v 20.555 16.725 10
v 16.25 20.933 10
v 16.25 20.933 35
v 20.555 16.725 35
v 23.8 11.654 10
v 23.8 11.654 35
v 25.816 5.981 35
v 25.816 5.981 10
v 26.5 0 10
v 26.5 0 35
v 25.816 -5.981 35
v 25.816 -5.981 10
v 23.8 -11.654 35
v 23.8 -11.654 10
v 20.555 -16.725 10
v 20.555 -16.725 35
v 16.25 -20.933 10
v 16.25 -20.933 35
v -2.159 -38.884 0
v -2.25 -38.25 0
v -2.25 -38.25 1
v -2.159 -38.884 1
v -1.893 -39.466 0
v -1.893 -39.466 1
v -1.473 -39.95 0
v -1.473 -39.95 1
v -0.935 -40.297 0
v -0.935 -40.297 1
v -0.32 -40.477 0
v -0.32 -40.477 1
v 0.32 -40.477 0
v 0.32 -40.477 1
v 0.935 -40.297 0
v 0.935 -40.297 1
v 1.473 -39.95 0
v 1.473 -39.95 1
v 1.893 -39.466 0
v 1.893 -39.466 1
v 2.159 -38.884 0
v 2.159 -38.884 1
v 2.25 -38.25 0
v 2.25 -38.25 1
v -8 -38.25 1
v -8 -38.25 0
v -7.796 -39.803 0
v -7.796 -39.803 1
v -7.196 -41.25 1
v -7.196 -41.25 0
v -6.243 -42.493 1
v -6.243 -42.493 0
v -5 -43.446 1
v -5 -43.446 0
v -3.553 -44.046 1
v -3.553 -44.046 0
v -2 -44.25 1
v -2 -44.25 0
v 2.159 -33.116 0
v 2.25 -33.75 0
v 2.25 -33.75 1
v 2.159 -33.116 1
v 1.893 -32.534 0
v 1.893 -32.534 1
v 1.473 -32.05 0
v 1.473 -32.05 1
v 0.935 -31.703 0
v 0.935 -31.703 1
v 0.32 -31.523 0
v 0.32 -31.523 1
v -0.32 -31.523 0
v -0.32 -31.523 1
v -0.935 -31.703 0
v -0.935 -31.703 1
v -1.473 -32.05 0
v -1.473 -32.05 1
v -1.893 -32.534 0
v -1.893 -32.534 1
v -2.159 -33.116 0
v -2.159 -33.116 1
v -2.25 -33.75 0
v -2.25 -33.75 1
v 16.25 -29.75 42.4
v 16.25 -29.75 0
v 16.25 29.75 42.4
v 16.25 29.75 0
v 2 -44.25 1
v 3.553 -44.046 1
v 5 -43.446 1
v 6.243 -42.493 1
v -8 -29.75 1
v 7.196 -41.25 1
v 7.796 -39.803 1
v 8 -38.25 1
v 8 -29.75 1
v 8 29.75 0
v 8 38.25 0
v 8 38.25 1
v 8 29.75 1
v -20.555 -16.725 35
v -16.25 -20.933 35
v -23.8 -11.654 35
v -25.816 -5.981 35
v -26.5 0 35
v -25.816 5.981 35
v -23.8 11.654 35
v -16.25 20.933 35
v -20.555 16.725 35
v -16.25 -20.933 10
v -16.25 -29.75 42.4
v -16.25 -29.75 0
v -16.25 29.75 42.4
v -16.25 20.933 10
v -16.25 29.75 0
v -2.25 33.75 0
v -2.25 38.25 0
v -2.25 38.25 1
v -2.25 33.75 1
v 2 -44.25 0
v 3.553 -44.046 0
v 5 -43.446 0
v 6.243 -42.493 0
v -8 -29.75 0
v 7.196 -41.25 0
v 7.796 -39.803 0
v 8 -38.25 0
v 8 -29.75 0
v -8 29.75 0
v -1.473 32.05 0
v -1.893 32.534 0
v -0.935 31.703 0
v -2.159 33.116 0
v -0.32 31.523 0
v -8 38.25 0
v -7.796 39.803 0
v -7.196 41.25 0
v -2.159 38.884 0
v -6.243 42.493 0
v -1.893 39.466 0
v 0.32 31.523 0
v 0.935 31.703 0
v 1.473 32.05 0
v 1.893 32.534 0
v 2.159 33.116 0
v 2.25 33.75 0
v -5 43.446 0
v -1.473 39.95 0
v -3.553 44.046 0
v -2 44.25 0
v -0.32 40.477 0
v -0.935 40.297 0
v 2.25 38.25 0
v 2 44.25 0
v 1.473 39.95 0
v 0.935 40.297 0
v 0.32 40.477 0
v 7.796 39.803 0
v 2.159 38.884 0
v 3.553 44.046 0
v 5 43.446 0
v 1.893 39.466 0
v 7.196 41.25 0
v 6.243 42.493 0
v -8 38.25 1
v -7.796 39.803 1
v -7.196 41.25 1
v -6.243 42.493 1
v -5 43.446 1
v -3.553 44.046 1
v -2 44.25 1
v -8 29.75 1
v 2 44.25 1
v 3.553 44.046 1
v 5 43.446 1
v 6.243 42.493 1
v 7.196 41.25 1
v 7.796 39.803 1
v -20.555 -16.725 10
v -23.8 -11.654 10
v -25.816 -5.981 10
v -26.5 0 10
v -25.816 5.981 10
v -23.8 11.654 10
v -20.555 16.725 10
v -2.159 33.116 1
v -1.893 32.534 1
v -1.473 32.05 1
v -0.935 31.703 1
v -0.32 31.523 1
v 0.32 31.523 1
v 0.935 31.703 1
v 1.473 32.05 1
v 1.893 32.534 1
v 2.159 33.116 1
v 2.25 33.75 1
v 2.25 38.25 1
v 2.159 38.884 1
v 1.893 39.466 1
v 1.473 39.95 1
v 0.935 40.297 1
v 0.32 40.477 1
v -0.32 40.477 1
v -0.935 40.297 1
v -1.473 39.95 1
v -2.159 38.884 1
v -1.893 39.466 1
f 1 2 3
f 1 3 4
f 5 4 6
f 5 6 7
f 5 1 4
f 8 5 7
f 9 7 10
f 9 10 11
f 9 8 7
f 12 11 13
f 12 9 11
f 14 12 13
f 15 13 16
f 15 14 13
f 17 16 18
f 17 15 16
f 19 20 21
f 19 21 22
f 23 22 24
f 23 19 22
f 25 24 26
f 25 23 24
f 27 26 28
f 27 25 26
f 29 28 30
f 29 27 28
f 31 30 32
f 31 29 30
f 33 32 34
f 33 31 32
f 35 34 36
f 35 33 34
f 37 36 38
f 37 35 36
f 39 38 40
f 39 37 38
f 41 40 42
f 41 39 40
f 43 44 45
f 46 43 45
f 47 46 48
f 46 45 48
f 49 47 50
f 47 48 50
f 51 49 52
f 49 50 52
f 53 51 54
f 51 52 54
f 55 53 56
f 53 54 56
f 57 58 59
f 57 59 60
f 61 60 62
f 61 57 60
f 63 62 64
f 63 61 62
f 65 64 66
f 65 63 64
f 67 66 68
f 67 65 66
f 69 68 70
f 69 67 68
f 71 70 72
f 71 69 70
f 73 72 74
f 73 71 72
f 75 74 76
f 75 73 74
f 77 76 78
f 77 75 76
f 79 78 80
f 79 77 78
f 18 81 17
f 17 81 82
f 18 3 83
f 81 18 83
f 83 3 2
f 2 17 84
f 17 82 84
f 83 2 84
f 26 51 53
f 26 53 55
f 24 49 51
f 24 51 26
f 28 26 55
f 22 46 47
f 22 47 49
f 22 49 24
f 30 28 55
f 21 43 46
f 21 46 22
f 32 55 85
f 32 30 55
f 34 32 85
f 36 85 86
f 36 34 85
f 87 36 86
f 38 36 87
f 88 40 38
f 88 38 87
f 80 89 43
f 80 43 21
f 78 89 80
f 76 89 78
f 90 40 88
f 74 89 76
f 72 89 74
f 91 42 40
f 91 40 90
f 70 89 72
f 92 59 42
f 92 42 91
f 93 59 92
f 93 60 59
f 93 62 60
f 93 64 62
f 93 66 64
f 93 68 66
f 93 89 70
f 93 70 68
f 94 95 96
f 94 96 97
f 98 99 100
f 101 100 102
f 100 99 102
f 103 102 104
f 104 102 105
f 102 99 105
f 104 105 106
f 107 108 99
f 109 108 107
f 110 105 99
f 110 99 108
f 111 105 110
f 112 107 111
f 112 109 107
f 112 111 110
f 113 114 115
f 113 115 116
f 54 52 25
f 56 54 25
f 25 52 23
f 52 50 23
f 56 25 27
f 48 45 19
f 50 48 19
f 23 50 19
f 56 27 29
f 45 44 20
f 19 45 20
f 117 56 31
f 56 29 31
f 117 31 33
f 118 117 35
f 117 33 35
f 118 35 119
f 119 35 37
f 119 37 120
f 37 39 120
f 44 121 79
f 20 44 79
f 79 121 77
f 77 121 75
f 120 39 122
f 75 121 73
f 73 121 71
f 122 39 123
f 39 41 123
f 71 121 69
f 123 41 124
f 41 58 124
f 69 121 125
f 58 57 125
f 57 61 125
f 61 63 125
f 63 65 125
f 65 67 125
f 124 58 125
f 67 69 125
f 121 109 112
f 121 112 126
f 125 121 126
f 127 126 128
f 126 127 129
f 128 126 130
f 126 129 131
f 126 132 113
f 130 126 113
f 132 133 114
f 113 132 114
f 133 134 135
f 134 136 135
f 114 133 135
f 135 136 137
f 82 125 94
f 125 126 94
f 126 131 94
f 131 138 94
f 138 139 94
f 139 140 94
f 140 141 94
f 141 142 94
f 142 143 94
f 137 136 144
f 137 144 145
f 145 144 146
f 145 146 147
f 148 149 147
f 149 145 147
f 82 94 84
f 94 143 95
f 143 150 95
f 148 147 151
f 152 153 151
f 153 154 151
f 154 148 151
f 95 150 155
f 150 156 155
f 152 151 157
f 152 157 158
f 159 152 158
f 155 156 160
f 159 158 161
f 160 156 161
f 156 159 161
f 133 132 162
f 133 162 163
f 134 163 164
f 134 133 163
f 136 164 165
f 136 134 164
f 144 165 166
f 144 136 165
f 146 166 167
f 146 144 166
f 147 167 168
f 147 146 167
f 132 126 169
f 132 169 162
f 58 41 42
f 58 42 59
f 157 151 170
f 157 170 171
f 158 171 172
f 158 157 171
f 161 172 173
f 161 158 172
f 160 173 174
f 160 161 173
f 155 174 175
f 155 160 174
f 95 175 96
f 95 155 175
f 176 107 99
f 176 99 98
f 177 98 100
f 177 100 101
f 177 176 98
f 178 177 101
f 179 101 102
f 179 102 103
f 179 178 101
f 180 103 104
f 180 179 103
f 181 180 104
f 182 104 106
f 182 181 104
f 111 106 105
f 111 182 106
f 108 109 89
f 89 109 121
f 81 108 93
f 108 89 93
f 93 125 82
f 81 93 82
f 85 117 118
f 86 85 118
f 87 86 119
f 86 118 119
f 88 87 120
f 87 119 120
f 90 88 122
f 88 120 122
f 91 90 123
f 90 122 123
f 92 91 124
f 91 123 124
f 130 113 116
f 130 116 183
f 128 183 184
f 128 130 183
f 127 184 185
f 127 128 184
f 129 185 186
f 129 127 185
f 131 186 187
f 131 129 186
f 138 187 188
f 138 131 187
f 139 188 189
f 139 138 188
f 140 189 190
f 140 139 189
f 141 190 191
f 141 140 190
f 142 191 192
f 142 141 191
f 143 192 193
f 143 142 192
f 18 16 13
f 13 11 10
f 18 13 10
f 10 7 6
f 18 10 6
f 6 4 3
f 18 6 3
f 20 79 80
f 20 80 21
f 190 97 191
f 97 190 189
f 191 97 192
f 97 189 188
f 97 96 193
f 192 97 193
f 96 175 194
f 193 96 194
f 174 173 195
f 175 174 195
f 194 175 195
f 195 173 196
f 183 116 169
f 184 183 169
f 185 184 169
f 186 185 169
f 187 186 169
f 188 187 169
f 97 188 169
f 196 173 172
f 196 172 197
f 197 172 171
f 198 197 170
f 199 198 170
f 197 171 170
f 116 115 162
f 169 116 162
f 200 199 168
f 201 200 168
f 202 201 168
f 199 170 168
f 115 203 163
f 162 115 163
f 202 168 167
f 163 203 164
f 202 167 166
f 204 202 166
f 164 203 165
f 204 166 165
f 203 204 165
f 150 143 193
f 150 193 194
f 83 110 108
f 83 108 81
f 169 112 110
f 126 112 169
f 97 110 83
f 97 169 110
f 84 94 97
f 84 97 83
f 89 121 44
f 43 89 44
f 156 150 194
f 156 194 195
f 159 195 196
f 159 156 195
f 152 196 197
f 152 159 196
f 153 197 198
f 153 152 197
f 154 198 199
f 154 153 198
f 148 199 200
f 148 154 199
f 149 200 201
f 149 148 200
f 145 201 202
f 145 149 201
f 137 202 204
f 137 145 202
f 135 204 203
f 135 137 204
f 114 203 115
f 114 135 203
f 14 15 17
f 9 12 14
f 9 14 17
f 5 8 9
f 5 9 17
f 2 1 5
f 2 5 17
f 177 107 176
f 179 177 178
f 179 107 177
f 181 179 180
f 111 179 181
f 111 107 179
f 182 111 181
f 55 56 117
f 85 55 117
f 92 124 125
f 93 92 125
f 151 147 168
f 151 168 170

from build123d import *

# Parameters (mm, degrees)
SKETCH_1_W      = 32.5
SKETCH_1_H      = 59.5
EXTRUDE_1_DEPTH = 42.4
EXTRUDE_2_DEPTH = 25
EXTRUDE_3_DEPTH = 1


with BuildPart() as part:
    # 草图1 → 拉伸1 (new body)
    with BuildSketch(Plane.XY):
        Rectangle(SKETCH_1_W, SKETCH_1_H)
    extrude(amount=EXTRUDE_1_DEPTH)

    # 草图2 → 拉伸2 (add)
    with BuildSketch(Plane.XY.offset(10)):
        with BuildLine():
            Line((-16.25, 20.932928605), (16.25, 20.932928605))
            ThreePointArc((16.25, 20.932928605), (26.5, 0), (16.25, -20.932928605))
            Line((16.25, -20.932928605), (-16.25, -20.932928605))
            ThreePointArc((-16.25, -20.932928605), (-26.5, 0), (-16.25, 20.932928605))
        make_face()
    extrude(amount=EXTRUDE_2_DEPTH)

    # 草图4 → 拉伸3 (add)
    # profile 1 of 2: a face of its own
    with BuildSketch(Plane.XY):
        with BuildLine():
            Line((-2, 44.25), (2, 44.25))
            ThreePointArc((2, 44.25), (6.242640687, 42.492640687), (8, 38.25))
            Line((8, 38.25), (8, 29.75))
            Line((8, 29.75), (-8, 29.75))
            Line((-8, 29.75), (-8, 38.25))
            ThreePointArc((-8, 38.25), (-6.242640687, 42.492640687), (-2, 44.25))
        make_face()
        with BuildLine():
            Line((-2.25, 38.25), (-2.25, 33.75))
            ThreePointArc((-2.25, 33.75), (0, 31.5), (2.25, 33.75))
            Line((2.25, 33.75), (2.25, 38.25))
            ThreePointArc((2.25, 38.25), (0, 40.5), (-2.25, 38.25))
        make_face(mode=Mode.SUBTRACT)
    # profile 2 of 2: a face of its own
    with BuildSketch(Plane.XY):
        with BuildLine():
            Line((-2, -44.25), (2, -44.25))
            ThreePointArc((2, -44.25), (6.242640687, -42.492640687), (8, -38.25))
            Line((8, -38.25), (8, -29.75))
            Line((8, -29.75), (-8, -29.75))
            Line((-8, -29.75), (-8, -38.25))
            ThreePointArc((-8, -38.25), (-6.242640687, -42.492640687), (-2, -44.25))
        make_face()
        with BuildLine():
            Line((2.25, -38.25), (2.25, -33.75))
            ThreePointArc((2.25, -33.75), (0, -31.5), (-2.25, -33.75))
            Line((-2.25, -33.75), (-2.25, -38.25))
            ThreePointArc((-2.25, -38.25), (0, -40.5), (2.25, -38.25))
        make_face(mode=Mode.SUBTRACT)
    extrude(amount=EXTRUDE_3_DEPTH)


solid = part.part
